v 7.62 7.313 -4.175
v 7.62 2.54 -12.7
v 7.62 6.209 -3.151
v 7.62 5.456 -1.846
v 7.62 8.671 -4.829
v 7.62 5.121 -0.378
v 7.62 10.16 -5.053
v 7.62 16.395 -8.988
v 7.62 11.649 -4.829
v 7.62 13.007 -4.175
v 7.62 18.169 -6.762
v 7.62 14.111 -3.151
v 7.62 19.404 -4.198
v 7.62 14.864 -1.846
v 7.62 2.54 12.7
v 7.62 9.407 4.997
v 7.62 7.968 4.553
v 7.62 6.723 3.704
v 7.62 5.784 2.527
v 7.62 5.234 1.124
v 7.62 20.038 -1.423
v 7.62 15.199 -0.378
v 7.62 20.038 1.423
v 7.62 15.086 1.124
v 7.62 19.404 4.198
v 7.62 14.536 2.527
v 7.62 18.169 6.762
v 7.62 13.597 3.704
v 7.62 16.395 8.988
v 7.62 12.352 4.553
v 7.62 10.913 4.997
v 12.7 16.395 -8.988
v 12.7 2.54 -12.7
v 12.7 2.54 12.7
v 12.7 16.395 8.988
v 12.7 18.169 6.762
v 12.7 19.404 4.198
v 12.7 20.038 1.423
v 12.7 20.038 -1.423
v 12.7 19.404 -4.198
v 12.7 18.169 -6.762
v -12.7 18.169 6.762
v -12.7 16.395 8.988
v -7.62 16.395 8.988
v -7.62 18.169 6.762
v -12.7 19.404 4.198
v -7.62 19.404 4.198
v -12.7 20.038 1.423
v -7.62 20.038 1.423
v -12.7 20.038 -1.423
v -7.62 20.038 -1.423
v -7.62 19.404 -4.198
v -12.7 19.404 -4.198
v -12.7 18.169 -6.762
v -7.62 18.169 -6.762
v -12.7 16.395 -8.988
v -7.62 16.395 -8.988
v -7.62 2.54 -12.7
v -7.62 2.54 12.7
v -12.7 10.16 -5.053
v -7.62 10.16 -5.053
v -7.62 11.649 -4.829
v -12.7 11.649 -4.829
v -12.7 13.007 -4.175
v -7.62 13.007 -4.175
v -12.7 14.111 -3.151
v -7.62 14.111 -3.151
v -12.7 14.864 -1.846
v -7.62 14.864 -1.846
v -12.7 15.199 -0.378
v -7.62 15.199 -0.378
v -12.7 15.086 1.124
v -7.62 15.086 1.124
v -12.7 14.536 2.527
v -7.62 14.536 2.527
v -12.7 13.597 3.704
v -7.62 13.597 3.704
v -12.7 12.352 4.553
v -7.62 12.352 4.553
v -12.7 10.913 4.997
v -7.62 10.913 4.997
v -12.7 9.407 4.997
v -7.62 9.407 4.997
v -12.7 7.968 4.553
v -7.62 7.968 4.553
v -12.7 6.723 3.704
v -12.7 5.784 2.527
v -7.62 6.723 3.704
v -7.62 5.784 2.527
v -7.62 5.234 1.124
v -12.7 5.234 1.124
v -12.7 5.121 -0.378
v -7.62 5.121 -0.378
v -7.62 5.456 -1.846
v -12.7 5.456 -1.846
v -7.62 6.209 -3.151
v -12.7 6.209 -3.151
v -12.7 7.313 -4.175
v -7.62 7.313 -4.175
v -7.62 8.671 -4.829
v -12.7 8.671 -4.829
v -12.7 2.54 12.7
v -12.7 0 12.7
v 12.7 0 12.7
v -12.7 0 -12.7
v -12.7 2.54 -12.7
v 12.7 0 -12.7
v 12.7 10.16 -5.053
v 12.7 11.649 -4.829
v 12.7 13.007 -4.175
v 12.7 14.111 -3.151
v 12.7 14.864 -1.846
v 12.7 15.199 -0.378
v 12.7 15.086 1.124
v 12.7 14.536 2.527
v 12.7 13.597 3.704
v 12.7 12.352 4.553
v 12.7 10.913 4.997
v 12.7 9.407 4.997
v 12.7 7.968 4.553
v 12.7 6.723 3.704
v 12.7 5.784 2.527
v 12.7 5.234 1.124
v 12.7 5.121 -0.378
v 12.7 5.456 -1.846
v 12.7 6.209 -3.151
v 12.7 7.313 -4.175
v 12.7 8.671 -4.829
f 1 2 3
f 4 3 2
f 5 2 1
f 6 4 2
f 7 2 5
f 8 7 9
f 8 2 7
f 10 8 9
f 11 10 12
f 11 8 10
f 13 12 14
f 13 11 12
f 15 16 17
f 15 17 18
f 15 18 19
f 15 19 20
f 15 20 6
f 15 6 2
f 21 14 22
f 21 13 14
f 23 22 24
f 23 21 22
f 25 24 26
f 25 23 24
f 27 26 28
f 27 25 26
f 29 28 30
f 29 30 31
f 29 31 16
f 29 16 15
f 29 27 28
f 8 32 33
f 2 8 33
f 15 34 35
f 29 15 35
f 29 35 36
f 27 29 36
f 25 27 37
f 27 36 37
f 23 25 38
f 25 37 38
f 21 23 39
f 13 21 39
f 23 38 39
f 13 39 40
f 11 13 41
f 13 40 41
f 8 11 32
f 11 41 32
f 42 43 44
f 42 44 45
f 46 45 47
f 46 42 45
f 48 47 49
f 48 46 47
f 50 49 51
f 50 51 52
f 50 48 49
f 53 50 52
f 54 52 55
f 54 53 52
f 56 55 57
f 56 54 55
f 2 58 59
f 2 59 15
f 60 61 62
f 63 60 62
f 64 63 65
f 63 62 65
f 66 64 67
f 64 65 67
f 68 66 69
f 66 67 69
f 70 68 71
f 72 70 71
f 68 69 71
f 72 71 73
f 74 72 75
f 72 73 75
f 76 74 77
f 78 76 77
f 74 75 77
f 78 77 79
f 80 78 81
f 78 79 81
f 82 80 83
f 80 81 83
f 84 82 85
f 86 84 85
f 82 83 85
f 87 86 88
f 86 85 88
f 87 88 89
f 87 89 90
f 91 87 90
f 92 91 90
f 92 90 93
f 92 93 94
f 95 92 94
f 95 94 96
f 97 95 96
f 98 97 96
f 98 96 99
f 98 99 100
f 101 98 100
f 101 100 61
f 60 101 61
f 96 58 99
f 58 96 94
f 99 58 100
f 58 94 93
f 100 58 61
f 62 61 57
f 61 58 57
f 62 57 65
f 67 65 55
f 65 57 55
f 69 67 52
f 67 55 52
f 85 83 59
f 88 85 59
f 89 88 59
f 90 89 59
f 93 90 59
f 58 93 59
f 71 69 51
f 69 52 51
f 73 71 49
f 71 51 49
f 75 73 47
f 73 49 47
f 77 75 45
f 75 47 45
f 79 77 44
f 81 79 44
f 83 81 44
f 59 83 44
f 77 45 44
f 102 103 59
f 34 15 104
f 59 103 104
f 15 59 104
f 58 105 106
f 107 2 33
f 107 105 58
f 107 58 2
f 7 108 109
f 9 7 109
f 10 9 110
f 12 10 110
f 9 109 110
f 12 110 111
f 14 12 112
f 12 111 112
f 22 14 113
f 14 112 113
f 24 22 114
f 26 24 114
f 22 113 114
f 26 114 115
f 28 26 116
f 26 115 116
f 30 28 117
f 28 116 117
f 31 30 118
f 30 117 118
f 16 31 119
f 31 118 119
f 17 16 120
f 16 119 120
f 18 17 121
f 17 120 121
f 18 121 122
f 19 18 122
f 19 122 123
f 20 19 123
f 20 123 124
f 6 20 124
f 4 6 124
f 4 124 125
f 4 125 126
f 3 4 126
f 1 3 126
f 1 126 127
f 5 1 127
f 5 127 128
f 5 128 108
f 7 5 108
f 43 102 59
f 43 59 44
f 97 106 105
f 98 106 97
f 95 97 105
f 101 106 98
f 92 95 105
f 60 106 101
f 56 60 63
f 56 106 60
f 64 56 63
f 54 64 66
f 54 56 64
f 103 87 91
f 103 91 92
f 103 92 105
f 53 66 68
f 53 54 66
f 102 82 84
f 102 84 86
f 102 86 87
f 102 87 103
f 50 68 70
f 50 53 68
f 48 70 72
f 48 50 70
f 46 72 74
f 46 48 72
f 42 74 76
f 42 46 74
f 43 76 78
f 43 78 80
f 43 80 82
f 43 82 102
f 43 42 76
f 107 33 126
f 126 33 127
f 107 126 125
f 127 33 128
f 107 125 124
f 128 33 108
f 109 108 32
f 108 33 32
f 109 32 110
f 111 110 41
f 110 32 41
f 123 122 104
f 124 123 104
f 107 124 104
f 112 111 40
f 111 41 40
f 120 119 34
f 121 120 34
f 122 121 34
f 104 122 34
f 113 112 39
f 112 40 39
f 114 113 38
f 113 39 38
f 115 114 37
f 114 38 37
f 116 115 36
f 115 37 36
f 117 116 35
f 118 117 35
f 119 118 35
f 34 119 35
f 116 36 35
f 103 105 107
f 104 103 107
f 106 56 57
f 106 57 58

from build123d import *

# Parameters (mm, degrees)
SKETCH1_W           = 25.4
SKETCH1_H           = 25.4
BOSS_EXTRUDE1_DEPTH = 2.54
BOSS_EXTRUDE2_DEPTH = 5.08
SKETCH3_R           = 5.053169443
CUT_EXTRUDE1_DEPTH  = 35.801810995


with BuildPart() as part:
    # Sketch1 → Boss-Extrude1 (new body)
    with BuildSketch(Plane(origin=(0, 0, 0), x_dir=(1, 0, 0), z_dir=(0, 1, 0))):
        Rectangle(SKETCH1_W, SKETCH1_H)
    extrude(amount=BOSS_EXTRUDE1_DEPTH)

    # Sketch2 → Boss-Extrude2 (add)
    with BuildSketch(Plane(origin=(12.7, 0, 0), x_dir=(0, 0, -1), z_dir=(1, 0, 0))):
        with BuildLine():
            Line((-12.7, 2.54), (-8.987628784, 16.394757994))
            ThreePointArc((-8.987628784, 16.394757994), (0, 20.11755573), (8.987628784, 16.394757994))
            Line((8.987628784, 16.394757994), (12.7, 2.54))
            Line((12.7, 2.54), (-12.7, 2.54))
        make_face()
    boss_extrude2 = extrude(amount=-BOSS_EXTRUDE2_DEPTH)

    # Mirror1: Boss-Extrude2 across plane
    add(boss_extrude2.mirror(Plane(origin=(0, 0, 0), x_dir=(0, 0, 1), z_dir=(1, 0, 0))))

    # Sketch3 → Cut-Extrude1 (cut, through all)
    with BuildSketch(Plane(origin=(12.7, 0, 0), x_dir=(0, 0, -1), z_dir=(1, 0, 0))):
        with Locations((0, 10.16)):
            Circle(SKETCH3_R)
    extrude(amount=-CUT_EXTRUDE1_DEPTH, mode=Mode.SUBTRACT)


solid = part.part
